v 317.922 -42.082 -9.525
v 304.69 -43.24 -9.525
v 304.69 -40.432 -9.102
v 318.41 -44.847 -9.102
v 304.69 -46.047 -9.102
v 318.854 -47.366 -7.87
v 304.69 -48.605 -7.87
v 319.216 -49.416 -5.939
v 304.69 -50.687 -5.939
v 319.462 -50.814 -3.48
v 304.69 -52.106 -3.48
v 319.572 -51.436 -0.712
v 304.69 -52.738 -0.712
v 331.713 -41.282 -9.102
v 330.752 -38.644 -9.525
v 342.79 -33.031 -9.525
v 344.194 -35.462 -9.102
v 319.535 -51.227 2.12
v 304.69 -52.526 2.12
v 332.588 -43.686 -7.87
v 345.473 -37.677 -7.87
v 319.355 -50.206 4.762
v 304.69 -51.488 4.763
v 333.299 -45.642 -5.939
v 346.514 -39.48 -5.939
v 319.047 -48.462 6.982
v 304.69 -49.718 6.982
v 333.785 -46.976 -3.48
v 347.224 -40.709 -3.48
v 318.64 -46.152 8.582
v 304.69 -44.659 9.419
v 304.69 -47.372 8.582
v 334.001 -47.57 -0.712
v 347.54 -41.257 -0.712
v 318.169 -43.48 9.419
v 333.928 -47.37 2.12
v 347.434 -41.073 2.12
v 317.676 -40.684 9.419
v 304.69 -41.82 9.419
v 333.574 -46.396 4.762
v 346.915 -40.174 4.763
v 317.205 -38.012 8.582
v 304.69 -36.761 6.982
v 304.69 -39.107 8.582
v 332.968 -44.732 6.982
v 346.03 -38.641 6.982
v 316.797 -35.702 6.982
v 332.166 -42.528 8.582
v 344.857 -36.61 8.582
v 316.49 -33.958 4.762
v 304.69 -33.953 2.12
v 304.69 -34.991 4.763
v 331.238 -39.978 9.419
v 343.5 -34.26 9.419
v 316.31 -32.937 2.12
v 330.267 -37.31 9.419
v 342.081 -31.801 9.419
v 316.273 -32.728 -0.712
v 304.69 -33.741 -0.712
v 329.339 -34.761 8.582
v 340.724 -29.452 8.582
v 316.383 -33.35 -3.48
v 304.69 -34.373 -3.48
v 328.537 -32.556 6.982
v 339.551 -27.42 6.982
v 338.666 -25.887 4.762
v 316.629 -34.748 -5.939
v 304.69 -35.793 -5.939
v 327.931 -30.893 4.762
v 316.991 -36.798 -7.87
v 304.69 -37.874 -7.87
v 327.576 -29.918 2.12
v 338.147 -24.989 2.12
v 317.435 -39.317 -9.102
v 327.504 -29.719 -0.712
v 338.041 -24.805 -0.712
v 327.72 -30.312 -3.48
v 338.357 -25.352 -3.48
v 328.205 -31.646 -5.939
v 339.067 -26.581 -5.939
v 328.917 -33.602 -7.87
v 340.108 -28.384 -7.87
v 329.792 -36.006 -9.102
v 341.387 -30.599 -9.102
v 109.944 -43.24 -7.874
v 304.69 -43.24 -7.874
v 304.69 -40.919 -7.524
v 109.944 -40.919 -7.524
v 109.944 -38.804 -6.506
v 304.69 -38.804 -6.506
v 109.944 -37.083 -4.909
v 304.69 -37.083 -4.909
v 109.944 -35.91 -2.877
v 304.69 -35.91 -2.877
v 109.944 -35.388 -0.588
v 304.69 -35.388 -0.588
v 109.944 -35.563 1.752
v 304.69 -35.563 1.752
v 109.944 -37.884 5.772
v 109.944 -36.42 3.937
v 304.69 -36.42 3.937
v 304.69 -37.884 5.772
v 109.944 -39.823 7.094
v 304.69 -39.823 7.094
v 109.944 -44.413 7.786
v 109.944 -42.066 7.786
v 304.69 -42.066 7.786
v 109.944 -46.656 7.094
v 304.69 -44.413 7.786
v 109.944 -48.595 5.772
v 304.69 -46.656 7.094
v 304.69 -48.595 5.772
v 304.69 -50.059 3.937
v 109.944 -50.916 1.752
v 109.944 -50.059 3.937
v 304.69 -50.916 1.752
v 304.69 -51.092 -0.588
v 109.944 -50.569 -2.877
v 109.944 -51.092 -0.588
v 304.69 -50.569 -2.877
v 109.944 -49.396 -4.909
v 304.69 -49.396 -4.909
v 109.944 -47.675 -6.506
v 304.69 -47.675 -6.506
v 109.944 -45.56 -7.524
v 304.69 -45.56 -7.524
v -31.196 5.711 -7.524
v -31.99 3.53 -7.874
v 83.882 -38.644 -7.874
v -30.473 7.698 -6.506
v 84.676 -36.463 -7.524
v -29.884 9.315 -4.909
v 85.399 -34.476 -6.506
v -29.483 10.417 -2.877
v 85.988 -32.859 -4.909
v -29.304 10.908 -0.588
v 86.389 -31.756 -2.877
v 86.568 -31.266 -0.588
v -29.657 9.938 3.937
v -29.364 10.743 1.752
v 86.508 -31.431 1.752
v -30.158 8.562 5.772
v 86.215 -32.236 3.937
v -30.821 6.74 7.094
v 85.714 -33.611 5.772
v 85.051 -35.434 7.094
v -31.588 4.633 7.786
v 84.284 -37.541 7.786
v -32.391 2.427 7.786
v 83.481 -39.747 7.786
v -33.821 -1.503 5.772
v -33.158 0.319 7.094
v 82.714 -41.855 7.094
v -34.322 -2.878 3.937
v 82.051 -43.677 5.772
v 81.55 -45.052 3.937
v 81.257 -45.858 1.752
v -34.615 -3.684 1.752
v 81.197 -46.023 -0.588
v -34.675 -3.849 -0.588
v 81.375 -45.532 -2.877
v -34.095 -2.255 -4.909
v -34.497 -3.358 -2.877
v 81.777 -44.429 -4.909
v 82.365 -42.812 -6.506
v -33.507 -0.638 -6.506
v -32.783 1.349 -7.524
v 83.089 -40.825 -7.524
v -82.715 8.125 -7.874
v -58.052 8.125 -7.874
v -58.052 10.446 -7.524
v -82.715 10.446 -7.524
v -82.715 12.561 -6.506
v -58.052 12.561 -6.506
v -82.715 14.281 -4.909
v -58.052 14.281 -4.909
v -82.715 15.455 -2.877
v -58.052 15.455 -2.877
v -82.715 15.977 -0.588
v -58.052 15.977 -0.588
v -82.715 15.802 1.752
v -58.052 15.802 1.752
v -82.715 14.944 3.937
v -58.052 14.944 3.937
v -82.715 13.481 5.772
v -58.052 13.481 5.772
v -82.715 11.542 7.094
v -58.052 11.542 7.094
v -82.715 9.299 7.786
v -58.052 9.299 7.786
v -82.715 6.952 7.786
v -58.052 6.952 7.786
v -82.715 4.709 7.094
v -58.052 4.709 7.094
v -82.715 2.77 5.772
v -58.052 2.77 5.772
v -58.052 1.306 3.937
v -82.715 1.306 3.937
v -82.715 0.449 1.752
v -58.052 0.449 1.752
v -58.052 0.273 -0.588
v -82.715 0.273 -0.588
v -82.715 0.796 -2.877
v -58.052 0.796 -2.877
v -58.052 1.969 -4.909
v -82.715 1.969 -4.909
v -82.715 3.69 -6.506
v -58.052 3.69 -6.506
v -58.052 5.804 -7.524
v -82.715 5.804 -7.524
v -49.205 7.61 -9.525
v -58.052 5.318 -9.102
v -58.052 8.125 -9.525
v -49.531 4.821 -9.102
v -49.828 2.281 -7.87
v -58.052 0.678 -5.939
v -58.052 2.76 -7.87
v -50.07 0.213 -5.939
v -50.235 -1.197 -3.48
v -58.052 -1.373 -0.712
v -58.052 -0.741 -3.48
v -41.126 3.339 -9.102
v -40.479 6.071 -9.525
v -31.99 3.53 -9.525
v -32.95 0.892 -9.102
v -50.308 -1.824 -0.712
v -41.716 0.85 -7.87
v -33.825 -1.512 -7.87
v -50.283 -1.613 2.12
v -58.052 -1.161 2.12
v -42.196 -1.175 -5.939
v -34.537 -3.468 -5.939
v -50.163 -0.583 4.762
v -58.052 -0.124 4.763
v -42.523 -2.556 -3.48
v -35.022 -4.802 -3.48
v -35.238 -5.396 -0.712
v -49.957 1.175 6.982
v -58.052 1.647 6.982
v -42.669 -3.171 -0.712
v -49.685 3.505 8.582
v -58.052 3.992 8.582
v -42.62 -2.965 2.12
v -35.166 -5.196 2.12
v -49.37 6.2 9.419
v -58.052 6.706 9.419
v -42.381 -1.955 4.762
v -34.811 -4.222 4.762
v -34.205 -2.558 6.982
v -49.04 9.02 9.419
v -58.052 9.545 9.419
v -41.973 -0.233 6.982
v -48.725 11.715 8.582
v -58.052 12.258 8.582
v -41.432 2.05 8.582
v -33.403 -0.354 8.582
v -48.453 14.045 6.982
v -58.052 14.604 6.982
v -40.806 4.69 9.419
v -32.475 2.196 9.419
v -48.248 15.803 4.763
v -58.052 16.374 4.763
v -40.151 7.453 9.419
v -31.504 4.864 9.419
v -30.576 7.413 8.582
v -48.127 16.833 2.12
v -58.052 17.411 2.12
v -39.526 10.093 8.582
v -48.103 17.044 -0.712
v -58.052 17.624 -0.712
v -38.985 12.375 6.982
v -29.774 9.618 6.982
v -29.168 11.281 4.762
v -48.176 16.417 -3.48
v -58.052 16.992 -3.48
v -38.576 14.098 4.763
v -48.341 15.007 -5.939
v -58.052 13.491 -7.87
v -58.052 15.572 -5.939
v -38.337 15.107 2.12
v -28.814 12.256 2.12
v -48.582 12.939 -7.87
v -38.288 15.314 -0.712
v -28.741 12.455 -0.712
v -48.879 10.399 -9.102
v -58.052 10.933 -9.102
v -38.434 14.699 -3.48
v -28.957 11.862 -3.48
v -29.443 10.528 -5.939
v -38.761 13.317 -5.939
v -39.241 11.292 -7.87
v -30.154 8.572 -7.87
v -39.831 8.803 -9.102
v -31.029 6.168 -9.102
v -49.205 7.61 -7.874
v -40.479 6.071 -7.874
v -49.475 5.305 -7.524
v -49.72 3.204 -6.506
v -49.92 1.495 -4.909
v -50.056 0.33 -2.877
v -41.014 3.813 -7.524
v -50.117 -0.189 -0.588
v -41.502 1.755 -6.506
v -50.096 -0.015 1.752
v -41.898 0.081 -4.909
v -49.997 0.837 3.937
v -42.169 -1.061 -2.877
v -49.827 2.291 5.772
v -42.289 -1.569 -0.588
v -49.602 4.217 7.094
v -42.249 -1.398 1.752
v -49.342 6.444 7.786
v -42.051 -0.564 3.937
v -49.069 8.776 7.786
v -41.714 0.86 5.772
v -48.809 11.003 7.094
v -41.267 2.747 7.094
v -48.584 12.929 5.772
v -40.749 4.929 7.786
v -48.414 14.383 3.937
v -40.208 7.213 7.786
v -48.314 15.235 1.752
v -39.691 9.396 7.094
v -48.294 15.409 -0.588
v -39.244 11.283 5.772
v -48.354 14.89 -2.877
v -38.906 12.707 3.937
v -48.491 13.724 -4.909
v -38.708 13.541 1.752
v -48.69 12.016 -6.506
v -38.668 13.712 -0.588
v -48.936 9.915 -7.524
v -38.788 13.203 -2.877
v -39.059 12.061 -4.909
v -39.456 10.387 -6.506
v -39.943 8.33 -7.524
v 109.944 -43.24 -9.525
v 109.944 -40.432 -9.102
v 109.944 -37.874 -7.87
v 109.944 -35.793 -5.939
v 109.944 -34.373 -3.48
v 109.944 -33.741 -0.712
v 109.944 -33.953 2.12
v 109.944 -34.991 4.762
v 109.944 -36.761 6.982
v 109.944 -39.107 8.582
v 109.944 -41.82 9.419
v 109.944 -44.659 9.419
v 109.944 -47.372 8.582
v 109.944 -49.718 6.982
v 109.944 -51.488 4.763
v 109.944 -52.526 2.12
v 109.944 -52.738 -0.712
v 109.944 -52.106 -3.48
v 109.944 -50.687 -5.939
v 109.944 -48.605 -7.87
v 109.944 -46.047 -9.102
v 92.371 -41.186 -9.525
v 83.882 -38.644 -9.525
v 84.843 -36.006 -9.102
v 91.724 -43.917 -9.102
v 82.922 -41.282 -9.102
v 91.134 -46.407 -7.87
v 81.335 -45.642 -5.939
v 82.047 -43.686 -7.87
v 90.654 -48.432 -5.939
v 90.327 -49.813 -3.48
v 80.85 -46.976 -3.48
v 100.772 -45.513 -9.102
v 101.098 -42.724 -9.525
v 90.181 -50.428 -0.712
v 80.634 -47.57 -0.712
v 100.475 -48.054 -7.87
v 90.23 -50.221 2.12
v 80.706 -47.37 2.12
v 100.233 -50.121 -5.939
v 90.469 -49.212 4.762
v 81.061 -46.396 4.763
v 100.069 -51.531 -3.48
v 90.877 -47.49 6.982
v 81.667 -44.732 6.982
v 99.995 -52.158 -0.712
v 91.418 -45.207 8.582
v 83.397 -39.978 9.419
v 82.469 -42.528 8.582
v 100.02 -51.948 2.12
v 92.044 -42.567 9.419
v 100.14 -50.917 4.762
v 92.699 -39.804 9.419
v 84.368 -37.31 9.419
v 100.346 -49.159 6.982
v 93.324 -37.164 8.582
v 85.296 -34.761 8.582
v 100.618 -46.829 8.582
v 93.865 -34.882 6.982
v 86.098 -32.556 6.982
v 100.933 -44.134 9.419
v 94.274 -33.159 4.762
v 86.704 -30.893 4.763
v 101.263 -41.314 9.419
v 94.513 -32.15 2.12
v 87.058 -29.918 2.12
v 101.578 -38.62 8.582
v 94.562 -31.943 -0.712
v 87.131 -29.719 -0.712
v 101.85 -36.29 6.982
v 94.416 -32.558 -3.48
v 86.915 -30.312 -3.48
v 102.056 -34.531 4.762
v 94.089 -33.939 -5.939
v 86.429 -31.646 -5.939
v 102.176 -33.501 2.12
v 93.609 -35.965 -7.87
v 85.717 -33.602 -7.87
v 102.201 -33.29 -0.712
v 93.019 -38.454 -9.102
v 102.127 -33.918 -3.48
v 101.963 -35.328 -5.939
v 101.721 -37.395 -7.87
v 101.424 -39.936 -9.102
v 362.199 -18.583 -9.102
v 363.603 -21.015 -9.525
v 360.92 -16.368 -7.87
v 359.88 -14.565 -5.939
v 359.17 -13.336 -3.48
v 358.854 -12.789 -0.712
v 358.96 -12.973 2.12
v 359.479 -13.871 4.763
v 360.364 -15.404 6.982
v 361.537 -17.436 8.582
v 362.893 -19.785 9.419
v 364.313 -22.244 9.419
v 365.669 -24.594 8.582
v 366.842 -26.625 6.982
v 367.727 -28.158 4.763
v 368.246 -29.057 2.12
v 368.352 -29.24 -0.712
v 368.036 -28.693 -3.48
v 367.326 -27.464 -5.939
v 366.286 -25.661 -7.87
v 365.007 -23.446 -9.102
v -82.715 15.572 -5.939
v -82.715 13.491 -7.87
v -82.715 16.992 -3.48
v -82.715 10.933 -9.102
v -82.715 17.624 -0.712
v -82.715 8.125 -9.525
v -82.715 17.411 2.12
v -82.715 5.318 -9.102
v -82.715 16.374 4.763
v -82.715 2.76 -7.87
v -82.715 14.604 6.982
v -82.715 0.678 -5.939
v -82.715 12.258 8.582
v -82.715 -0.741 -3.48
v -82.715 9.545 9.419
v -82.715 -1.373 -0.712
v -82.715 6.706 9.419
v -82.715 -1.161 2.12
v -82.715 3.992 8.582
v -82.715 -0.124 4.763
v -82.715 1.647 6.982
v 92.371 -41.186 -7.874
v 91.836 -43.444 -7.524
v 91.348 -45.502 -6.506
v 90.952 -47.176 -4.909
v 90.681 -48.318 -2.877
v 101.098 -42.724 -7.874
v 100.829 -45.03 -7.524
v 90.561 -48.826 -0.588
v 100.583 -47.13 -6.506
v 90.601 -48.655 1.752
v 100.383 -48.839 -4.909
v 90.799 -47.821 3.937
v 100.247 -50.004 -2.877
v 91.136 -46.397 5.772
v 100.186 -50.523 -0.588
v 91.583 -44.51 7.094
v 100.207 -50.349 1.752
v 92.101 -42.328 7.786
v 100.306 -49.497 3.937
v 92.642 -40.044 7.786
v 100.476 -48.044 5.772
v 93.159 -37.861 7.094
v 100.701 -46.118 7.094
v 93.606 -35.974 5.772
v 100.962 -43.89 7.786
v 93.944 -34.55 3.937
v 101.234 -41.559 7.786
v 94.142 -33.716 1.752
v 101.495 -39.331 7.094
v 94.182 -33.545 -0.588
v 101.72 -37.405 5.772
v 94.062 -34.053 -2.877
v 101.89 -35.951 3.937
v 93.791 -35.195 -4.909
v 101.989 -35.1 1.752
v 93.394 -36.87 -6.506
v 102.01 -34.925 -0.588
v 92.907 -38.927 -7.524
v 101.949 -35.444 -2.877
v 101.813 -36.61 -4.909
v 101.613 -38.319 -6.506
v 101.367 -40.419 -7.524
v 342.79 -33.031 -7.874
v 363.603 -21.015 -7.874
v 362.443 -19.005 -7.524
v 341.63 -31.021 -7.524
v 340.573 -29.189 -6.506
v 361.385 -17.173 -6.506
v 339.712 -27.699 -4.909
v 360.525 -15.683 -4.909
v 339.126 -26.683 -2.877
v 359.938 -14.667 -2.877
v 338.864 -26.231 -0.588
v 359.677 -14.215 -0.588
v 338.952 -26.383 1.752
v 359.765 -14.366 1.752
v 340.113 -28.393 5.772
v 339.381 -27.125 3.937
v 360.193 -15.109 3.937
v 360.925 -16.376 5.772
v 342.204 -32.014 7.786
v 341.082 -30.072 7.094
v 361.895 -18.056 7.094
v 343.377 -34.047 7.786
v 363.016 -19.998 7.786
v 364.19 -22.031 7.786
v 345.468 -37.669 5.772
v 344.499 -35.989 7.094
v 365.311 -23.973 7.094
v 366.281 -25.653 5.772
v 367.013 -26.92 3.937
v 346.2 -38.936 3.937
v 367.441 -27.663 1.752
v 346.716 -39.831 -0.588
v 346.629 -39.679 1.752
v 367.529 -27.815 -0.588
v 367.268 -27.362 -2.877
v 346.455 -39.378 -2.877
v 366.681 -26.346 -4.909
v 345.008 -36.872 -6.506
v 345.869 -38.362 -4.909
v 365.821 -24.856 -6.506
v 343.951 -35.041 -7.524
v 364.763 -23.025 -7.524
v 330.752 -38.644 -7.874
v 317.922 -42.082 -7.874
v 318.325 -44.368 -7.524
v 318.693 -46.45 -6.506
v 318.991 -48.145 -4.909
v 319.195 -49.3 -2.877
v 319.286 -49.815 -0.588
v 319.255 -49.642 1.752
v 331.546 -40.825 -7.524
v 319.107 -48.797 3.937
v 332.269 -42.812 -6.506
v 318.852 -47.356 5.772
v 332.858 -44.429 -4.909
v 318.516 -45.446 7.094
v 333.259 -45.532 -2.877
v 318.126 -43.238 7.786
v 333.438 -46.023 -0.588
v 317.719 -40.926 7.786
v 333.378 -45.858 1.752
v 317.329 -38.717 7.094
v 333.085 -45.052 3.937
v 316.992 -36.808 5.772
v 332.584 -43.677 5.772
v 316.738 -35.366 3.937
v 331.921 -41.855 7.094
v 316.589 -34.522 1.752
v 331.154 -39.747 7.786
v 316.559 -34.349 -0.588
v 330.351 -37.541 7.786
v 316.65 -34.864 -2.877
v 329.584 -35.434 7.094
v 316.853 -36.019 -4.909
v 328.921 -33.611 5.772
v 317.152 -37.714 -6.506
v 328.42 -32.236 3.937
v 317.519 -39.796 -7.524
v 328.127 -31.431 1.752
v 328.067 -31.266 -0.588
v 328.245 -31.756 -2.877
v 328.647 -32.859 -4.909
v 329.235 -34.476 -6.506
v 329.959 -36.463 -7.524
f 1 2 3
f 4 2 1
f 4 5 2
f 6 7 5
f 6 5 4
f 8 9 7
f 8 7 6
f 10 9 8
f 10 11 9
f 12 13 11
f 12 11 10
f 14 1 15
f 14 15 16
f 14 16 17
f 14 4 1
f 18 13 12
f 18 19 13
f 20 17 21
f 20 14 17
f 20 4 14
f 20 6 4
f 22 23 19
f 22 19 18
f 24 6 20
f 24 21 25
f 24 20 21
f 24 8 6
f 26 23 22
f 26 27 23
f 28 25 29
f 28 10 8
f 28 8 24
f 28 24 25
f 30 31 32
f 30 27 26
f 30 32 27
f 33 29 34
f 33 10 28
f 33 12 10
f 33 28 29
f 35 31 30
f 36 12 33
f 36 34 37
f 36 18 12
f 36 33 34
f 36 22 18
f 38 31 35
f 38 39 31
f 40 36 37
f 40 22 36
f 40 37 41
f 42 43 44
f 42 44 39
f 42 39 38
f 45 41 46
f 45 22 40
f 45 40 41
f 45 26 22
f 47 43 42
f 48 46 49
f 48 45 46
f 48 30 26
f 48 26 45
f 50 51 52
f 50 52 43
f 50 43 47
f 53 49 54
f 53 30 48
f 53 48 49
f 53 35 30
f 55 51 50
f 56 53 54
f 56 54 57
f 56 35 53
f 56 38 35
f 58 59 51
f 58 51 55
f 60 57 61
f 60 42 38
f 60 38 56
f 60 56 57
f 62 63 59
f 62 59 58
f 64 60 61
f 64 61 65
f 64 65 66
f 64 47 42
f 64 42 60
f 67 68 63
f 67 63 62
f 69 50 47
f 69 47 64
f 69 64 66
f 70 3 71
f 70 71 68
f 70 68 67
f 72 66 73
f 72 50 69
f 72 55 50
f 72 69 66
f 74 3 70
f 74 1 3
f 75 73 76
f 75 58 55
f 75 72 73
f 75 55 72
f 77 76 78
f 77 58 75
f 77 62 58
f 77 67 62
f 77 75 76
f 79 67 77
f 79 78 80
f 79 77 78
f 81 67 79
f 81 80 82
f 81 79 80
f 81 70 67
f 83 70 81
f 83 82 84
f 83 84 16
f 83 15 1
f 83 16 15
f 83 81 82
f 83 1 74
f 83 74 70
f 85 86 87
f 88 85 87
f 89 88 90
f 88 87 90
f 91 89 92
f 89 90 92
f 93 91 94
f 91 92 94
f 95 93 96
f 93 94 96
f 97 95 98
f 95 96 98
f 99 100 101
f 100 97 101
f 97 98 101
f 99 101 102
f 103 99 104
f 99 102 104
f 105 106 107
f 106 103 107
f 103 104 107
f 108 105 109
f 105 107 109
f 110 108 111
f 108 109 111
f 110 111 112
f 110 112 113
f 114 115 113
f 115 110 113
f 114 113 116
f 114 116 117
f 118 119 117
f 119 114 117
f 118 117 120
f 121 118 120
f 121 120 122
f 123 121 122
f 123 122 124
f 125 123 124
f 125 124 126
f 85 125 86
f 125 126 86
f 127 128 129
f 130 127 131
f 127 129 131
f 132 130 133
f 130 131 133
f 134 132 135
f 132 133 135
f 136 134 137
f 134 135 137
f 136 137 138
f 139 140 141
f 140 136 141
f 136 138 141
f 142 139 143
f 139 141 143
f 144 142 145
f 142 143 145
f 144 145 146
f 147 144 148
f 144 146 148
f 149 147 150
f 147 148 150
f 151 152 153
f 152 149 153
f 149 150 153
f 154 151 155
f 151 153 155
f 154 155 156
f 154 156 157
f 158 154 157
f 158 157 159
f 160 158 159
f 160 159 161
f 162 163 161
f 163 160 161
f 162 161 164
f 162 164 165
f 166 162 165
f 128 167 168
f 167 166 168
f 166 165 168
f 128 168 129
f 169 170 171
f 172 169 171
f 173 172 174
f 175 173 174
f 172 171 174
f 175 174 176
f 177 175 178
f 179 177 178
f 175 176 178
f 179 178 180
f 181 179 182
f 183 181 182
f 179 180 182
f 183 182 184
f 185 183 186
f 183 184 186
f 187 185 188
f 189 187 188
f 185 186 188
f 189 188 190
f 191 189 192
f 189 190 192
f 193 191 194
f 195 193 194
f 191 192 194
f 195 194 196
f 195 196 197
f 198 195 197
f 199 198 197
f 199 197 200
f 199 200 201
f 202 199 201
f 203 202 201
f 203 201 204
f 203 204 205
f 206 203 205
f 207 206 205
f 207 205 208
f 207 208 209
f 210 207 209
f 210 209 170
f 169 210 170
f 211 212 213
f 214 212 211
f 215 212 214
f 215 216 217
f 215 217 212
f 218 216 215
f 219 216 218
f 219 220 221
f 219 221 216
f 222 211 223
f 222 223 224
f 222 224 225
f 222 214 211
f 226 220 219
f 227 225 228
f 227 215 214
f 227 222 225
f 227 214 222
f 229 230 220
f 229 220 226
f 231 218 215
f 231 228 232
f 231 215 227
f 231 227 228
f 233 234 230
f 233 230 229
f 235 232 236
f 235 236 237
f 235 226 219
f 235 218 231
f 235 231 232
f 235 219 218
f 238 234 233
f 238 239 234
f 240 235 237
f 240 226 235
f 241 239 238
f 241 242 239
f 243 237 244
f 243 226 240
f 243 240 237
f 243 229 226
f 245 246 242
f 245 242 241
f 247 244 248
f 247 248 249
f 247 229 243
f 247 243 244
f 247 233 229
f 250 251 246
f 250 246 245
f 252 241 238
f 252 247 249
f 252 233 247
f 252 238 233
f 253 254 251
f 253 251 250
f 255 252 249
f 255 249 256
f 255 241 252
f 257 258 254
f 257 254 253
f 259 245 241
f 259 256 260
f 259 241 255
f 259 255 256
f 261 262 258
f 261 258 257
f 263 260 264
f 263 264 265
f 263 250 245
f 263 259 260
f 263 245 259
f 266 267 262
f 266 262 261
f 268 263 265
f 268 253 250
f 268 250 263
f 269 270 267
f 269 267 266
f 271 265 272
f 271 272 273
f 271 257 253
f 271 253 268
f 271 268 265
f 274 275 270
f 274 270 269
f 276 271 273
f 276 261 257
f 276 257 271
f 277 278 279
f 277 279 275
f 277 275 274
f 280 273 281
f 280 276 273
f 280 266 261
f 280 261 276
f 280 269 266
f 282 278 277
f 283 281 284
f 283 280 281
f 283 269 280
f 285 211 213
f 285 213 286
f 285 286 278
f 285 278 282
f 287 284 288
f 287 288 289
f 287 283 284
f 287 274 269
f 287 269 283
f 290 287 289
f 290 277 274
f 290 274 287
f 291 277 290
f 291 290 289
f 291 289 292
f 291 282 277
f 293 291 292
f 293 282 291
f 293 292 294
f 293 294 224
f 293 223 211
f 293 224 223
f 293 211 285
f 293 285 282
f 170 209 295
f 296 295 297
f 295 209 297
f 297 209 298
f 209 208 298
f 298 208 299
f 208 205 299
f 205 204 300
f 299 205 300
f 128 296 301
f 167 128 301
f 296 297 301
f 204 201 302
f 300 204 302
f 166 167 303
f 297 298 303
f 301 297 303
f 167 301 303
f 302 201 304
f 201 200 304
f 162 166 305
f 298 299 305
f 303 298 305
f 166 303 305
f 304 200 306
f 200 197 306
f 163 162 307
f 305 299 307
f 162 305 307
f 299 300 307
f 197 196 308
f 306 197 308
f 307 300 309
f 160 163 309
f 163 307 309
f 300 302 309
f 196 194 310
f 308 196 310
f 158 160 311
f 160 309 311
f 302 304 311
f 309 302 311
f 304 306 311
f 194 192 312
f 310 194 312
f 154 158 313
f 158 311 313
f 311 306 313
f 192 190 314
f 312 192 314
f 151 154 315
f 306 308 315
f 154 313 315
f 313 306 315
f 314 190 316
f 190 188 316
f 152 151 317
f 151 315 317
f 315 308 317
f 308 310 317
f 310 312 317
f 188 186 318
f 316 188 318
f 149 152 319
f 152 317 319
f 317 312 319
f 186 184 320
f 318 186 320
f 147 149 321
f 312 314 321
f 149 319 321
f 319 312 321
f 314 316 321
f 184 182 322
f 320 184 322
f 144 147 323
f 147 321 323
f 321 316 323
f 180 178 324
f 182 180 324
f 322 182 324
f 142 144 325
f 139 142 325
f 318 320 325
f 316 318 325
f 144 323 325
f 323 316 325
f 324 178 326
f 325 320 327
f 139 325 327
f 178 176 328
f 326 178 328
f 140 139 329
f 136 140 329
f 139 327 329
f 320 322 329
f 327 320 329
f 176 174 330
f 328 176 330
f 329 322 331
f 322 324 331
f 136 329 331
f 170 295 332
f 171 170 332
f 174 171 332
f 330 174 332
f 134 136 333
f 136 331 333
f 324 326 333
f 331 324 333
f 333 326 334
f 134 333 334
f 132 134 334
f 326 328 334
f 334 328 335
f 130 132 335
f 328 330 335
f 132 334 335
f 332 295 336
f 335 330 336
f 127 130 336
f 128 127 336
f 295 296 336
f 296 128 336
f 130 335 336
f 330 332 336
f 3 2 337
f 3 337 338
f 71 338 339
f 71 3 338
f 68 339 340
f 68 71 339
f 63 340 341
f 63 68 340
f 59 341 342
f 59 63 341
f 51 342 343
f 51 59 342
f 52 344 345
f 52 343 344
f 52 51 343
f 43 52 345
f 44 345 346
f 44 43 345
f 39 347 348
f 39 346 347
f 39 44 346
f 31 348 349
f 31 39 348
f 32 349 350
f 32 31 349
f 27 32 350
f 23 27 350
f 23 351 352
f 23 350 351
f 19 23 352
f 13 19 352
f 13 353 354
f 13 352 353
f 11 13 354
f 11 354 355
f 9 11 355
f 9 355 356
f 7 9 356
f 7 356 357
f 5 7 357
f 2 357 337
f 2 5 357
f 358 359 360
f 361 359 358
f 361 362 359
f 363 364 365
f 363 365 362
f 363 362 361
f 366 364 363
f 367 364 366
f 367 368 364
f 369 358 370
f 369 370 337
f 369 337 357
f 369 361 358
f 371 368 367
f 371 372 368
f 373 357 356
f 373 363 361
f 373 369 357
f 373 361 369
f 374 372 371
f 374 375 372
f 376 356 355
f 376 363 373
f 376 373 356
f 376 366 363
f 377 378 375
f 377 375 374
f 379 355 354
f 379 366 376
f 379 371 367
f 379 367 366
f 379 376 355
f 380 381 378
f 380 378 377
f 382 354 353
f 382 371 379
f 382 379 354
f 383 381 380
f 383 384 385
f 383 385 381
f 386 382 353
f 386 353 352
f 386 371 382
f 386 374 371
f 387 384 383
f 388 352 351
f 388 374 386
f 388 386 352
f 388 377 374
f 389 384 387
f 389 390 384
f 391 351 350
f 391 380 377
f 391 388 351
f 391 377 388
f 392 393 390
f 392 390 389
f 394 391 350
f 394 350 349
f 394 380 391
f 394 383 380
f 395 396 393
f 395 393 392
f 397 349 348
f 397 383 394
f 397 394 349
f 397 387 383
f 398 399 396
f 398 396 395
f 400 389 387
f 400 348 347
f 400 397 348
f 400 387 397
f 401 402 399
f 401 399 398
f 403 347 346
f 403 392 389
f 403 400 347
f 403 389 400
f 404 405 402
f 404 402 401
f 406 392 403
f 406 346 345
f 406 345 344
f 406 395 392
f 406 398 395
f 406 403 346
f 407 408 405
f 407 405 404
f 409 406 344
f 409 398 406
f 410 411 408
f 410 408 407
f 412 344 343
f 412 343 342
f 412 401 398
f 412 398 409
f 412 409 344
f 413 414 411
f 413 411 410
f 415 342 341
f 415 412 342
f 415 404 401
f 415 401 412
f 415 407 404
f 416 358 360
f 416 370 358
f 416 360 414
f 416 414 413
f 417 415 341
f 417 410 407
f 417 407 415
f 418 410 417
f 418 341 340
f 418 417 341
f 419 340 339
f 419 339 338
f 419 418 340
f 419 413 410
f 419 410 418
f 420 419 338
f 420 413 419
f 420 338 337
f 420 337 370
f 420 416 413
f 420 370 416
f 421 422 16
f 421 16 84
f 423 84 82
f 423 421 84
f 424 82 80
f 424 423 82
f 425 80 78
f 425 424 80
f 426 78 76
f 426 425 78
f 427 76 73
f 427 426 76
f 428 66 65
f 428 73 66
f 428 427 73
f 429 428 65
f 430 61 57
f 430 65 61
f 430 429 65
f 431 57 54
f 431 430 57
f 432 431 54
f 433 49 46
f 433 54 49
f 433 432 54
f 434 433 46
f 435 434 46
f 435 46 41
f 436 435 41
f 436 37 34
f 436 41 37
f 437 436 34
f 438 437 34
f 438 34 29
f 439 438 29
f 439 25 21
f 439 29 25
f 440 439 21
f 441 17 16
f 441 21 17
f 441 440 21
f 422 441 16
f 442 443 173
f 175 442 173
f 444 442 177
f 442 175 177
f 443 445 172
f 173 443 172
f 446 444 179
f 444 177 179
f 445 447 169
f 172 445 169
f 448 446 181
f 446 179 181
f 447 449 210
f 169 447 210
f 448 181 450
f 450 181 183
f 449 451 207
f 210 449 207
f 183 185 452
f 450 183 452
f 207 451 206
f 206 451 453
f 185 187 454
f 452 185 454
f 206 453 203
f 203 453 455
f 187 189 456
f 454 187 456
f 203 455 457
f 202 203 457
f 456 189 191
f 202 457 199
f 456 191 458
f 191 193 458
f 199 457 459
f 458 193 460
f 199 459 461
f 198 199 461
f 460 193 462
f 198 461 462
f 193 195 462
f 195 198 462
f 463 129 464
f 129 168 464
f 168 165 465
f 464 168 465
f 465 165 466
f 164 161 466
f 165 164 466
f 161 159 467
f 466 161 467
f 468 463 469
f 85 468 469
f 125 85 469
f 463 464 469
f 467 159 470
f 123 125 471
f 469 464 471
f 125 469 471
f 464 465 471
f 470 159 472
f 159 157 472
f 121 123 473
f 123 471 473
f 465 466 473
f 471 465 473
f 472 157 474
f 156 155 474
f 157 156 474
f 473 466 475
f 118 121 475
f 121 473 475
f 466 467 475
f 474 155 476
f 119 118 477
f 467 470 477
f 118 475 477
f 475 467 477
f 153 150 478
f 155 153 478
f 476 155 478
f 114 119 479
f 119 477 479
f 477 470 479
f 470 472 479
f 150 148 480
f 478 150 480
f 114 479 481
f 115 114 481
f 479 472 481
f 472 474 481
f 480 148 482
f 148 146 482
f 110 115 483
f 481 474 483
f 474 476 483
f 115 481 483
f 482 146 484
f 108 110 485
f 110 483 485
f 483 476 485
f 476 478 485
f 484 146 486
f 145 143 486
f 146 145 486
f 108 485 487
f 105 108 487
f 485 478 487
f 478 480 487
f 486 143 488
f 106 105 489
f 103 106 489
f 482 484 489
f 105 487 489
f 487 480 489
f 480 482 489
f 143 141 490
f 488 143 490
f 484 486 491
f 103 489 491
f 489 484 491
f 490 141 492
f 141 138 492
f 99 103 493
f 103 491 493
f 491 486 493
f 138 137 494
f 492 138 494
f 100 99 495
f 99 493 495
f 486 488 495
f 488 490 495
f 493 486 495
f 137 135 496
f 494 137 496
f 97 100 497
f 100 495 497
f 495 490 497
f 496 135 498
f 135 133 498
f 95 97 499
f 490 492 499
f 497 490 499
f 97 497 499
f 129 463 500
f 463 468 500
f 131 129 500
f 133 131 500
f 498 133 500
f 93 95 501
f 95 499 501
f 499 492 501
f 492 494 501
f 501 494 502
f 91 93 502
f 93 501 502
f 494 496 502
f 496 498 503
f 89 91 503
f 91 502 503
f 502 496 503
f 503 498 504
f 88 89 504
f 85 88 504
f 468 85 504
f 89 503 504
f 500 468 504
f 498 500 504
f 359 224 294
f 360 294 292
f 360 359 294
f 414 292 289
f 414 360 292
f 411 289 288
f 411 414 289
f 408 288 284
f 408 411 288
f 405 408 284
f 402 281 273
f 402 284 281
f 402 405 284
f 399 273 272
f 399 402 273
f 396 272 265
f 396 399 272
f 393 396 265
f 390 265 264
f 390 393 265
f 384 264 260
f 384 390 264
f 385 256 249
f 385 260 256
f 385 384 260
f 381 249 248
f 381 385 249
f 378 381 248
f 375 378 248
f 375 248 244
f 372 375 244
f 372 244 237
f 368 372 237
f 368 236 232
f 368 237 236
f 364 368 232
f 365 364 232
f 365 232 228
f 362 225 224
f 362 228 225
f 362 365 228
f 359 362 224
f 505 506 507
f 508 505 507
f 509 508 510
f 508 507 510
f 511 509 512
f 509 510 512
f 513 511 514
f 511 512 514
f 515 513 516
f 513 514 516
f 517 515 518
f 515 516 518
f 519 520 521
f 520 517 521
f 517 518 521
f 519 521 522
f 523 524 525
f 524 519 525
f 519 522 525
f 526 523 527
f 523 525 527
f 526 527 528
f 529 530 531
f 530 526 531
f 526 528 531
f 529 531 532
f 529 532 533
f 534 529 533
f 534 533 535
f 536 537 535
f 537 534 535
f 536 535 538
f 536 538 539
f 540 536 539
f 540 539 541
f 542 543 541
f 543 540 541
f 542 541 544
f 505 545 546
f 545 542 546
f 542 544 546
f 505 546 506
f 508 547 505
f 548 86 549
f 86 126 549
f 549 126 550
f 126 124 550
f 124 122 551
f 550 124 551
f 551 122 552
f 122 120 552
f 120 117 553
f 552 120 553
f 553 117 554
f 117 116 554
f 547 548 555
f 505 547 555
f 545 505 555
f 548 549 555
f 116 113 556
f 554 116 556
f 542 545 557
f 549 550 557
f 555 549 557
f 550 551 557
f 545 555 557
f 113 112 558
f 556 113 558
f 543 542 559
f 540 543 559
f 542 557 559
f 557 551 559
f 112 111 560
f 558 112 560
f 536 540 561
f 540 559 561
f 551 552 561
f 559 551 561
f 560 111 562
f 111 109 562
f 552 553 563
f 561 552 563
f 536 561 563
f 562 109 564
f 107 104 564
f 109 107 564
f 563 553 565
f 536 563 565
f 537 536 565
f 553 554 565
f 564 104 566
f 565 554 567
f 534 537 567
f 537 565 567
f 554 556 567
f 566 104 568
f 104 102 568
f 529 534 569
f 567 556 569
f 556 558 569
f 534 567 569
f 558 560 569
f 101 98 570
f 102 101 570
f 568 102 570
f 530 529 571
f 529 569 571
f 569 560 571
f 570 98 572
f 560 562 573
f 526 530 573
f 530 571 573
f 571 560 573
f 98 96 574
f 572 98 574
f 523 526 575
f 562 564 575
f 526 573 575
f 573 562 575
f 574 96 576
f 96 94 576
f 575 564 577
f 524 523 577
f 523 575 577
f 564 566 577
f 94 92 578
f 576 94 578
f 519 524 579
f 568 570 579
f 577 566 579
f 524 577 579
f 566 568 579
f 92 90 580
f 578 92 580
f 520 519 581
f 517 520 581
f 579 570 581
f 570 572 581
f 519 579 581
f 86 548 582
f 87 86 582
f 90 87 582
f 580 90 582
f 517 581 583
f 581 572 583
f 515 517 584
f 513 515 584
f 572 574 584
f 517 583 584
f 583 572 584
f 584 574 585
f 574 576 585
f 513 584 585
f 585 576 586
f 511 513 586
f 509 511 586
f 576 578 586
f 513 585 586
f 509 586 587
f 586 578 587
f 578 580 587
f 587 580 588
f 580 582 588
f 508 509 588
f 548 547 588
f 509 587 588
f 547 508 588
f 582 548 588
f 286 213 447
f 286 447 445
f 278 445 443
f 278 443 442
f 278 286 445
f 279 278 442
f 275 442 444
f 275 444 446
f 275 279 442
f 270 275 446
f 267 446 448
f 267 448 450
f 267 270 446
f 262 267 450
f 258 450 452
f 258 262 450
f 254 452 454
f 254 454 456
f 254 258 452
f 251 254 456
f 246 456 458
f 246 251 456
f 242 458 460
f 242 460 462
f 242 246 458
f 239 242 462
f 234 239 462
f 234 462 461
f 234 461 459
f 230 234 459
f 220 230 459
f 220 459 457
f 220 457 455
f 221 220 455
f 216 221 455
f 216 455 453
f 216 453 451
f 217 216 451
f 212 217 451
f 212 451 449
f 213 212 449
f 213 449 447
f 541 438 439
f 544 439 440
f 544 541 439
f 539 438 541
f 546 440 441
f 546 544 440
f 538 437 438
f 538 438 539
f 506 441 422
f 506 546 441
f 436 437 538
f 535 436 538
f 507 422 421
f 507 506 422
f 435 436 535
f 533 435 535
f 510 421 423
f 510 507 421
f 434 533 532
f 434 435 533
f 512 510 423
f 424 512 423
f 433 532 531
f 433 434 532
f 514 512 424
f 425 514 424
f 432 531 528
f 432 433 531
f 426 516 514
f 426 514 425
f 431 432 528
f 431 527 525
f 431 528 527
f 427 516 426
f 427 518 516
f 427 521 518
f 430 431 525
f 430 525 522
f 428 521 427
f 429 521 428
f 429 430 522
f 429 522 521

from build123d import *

# Parameters (mm, degrees)
SKETCH2_R   = 9.525
SKETCH2_R_2 = 7.874


with BuildPart() as part:
    # Sweep1: sweep along a path in Sketch1
    with BuildLine(Plane.XY) as sweep1_path:
        Line((-82.715438584, 8.125207387), (-58.051554514, 8.125207387))
        ThreePointArc((-58.051554514, 8.125207387), (-44.819563376, 6.967558166), (-31.989619593, 3.529785091))
        Line((-31.989619593, 3.529785091), (83.882345193, -38.644161077))
        ThreePointArc((83.882345193, -38.644161077), (96.712288976, -42.081934153), (109.944280114, -43.239583374))
        Line((109.944280114, -43.239583374), (304.690435721, -43.239583374))
        ThreePointArc((304.690435721, -43.239583374), (324.412446958, -40.643131337), (342.790435721, -33.030719142))
        Line((342.790435721, -33.030719142), (363.602993383, -21.014583374))
    # Sketch2 → Sweep1 (sweep)
    with BuildSketch(Plane(origin=(-82.715438584, 8.125207387, 0), x_dir=(0, 0, -1), z_dir=(1, 0, 0))):
        Circle(SKETCH2_R)
        Circle(SKETCH2_R_2, mode=Mode.SUBTRACT)
    sweep(path=sweep1_path.line)


solid = part.part
